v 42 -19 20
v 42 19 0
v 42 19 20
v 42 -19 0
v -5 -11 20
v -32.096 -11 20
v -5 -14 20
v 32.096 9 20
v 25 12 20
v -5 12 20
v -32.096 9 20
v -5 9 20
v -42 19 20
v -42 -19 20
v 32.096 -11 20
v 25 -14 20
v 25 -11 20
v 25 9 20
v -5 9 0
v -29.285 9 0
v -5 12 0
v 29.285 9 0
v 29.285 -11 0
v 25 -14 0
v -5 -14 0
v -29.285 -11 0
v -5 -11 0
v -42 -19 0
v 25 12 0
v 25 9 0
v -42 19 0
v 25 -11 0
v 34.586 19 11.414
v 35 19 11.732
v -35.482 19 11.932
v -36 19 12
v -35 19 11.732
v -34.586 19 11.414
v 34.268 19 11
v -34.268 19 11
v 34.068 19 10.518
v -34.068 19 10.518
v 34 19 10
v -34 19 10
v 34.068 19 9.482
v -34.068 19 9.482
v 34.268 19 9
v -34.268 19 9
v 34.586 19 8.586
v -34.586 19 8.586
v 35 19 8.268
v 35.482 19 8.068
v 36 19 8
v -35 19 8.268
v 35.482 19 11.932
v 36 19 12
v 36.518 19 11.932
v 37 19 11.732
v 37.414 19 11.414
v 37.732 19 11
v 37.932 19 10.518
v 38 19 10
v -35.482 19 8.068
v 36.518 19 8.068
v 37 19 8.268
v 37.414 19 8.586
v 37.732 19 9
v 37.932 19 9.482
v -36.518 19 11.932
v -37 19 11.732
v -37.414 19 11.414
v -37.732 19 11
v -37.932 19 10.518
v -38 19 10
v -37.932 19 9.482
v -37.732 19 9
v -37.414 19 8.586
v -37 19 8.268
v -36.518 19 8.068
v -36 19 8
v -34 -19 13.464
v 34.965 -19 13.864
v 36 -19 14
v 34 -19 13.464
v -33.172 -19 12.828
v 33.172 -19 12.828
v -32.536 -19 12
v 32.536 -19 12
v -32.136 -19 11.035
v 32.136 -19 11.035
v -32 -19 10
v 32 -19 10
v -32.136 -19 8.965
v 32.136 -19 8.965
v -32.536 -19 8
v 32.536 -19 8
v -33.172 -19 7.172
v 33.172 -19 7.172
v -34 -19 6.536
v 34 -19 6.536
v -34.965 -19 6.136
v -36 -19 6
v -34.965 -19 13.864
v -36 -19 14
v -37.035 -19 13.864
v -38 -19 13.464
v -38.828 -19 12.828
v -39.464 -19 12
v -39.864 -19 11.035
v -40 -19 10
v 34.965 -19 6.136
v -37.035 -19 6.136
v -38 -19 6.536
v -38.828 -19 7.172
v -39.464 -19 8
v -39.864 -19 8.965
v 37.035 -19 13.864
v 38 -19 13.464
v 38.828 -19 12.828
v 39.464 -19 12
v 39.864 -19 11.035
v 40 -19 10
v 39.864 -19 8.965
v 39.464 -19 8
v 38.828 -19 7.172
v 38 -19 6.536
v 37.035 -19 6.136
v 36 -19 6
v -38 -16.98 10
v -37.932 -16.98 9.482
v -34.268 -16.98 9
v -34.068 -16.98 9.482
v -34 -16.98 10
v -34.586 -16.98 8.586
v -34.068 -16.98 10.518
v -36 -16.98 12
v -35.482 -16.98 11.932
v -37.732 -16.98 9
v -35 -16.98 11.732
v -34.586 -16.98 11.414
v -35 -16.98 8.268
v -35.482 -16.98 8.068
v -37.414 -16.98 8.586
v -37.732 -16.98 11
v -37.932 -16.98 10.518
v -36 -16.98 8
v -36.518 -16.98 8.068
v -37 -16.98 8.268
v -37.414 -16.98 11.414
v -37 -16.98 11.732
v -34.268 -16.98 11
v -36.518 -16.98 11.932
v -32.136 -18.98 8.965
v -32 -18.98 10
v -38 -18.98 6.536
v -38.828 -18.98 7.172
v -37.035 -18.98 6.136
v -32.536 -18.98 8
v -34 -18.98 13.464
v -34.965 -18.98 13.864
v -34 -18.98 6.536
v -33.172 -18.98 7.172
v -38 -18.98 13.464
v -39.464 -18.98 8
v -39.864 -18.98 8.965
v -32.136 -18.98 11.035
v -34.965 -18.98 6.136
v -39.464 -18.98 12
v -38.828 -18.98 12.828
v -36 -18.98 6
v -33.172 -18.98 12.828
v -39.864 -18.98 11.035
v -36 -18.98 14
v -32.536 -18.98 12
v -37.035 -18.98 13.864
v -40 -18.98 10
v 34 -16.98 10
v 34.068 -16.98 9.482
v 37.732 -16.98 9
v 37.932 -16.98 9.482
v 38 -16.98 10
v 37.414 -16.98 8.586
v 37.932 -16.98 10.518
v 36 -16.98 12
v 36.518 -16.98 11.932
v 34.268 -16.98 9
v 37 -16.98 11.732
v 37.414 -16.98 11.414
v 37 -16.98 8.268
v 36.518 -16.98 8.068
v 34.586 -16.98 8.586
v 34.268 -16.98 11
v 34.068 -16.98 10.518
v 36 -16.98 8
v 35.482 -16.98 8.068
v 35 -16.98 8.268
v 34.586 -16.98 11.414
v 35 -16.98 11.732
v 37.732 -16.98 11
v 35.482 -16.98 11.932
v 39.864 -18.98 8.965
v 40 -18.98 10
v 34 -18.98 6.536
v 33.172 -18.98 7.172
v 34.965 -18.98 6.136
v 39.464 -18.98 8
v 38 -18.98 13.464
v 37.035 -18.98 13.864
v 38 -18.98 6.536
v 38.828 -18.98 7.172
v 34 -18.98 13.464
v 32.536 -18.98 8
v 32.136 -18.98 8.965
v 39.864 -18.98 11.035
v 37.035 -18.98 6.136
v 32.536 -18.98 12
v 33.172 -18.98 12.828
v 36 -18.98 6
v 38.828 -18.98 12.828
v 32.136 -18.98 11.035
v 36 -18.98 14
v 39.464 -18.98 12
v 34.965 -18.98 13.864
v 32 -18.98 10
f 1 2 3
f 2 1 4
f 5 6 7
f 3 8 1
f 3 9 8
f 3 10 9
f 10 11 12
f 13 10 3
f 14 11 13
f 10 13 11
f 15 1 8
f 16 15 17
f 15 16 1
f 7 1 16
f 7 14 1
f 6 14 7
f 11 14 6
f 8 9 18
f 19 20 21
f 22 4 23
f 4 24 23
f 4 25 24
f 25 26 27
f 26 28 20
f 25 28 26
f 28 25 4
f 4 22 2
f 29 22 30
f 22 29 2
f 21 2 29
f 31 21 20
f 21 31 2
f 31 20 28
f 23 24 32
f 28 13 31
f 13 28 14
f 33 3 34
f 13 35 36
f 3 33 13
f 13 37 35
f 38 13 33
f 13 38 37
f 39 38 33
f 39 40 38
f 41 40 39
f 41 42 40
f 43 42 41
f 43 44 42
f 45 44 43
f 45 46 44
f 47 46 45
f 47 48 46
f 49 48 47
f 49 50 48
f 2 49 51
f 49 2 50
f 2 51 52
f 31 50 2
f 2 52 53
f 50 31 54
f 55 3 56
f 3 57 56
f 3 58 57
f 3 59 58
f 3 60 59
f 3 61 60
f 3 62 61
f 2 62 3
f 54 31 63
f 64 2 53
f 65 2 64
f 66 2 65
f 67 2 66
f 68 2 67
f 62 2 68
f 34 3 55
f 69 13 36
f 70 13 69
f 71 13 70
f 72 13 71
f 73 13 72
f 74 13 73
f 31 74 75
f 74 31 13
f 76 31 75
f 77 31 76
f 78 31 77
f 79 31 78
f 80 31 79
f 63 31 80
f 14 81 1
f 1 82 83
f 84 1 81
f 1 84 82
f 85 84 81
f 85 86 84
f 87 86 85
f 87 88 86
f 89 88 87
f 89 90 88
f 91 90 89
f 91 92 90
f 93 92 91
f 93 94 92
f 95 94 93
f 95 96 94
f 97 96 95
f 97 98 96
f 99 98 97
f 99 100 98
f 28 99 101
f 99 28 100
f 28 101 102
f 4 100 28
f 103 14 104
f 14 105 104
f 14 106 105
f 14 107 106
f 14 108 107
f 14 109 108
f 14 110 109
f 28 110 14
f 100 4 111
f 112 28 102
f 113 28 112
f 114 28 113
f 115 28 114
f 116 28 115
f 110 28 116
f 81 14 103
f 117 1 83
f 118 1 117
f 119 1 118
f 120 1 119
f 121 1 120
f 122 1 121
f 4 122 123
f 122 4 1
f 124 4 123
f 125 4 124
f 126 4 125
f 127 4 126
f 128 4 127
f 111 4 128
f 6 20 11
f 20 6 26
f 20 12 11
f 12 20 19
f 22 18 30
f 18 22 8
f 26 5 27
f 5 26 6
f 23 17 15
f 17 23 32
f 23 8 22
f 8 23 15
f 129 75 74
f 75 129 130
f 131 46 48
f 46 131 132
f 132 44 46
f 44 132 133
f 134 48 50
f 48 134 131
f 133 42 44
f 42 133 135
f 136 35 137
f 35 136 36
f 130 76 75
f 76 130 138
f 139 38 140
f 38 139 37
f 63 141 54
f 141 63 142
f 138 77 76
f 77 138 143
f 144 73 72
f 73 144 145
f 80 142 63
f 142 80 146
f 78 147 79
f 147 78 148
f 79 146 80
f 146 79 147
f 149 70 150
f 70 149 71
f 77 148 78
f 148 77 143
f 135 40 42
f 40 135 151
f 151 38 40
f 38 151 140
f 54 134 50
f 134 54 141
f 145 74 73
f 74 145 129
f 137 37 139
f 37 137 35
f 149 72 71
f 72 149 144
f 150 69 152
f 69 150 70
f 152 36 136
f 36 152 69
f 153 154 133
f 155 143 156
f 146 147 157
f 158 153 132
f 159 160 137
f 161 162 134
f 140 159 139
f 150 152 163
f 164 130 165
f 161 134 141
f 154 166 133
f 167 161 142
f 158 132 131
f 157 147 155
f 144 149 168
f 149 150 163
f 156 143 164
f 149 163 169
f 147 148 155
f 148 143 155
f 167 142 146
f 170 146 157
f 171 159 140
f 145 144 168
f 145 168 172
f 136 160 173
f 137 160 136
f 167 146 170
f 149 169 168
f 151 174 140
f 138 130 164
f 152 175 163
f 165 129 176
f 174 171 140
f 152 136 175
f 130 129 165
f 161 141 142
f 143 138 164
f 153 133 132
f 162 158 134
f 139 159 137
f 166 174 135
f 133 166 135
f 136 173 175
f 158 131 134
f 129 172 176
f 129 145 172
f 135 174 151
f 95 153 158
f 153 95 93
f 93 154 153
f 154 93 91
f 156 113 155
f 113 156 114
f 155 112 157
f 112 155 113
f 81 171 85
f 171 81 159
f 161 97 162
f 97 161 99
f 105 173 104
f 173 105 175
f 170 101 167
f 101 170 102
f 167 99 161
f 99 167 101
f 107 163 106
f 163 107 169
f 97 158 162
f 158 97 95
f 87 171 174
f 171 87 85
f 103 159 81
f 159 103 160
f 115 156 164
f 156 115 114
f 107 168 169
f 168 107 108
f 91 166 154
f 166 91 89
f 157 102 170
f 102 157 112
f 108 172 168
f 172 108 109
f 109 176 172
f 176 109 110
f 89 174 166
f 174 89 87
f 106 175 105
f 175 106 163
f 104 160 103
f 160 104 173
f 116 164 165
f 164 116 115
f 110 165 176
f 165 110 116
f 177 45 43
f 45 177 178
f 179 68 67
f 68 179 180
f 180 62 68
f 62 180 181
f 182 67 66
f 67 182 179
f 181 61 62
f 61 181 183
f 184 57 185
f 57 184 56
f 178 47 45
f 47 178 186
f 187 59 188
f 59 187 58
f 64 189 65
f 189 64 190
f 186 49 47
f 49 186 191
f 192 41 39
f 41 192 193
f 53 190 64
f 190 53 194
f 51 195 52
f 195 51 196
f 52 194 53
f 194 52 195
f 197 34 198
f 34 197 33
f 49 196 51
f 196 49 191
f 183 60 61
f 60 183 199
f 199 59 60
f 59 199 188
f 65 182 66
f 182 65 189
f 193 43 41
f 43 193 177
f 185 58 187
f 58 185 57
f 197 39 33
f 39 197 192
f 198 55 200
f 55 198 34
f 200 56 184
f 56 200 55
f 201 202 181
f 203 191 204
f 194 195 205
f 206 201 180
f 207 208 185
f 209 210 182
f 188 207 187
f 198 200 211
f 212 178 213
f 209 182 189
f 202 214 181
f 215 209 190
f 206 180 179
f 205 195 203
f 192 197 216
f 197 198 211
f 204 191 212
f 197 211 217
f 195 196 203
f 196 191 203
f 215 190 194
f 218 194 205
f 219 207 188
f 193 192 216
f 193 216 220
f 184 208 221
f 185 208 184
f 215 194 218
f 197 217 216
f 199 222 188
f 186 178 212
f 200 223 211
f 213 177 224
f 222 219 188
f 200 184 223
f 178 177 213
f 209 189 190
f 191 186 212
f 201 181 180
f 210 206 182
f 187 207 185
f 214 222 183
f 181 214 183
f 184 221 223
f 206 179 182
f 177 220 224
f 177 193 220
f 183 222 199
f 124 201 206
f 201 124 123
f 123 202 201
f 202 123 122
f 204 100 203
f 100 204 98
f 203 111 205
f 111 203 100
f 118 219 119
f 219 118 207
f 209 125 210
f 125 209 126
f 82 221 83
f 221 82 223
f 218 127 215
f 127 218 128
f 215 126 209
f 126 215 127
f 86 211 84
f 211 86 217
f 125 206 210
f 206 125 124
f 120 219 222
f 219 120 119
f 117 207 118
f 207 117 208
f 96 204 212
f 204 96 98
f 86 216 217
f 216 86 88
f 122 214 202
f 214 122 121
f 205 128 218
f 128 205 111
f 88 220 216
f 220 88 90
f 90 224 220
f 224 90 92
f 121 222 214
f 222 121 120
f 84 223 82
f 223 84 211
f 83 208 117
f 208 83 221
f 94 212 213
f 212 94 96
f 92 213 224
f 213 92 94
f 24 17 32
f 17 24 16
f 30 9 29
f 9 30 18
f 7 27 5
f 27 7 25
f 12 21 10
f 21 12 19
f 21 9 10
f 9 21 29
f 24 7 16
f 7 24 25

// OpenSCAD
// Crimp holder 3D Design

// Copyright (c) 2014 by Jeremy Bennett <jeremy.bennett@embecosm.com>

// Crimp holder 3D Design is licensed under a Creative Commons
// Attribution-ShareAlike 3.0 Unported License.

// You should have received a copy of the license along with this work.  If not,
// see <http://creativecommons.org/licenses/by-sa/3.0/>.

// -----------------------------------------------------------------------------

// A screw hole with a countersink
module screwhole (bore, length) {
	iota = length / 100;
	half_length = length / 2 + iota;
	full_length = half_length * 2;
	union () {
		cylinder (d = bore, h = full_length, center = true, $fn = 24);
		translate (v = [0, 0, -half_length + bore / 4 + bore / 10])
			cylinder (d1 = bore * 2, d2 = bore, h = bore / 2, center = true, $fn = 24);
		translate (v = [0, 0, -half_length + bore / 20])
			cylinder (d = bore * 2, h = bore / 10, center = true, $fn = 24);
	}
}


// A screw hole for a screw parallel with the Y axis
module screwhole_y (bore, length, x_off, z_off) {
	translate (v = [x_off, 0, z_off])
		rotate (a = [-90, 0, 0])
			screwhole (bore = bore, length = length);
}


// The main holder block

// @param base_len  Length of the hole at the base
// @param base_width  Width of the base
module crimp_block (base_len, base_width) {
	difference () {
		translate (v = [0, 0, 10])
			cube (size = [base_len + 26, base_width + 18, 20], center = true);
		rotate (a = [0, -8, 0])
			translate (v = [-base_len / 4, -1, 30])
				cube (size = [base_len / 2, base_width, 60], center = true);
		rotate (a = [0, 8, 0])
			translate (v = [base_len / 4, -1, 30])
				cube (size = [base_len / 2, base_width, 60], center = true);
		translate (v = [0, -1, 29])
			cube (size = [base_len / 2, base_width, 60], center = true);
	}
}


// Crimp support with screwholes
module crimp_support () {
	base_len = 58;
   base_width = 20;
	screw_off = base_len / 2 + 7;
	screw_len = base_width + 18;
	difference () {
		crimp_block (base_len = base_len, base_width = base_width);
		screwhole_y (bore = 4, length = 38, x_off = -screw_off, z_off = 10);
		screwhole_y (bore = 4, length = 38, x_off =  screw_off, z_off = 10);
		translate (v = [10, -1, 29])
			cube (size = [30, base_width + 6, 60], center = true);
	}
}


crimp_support ();
